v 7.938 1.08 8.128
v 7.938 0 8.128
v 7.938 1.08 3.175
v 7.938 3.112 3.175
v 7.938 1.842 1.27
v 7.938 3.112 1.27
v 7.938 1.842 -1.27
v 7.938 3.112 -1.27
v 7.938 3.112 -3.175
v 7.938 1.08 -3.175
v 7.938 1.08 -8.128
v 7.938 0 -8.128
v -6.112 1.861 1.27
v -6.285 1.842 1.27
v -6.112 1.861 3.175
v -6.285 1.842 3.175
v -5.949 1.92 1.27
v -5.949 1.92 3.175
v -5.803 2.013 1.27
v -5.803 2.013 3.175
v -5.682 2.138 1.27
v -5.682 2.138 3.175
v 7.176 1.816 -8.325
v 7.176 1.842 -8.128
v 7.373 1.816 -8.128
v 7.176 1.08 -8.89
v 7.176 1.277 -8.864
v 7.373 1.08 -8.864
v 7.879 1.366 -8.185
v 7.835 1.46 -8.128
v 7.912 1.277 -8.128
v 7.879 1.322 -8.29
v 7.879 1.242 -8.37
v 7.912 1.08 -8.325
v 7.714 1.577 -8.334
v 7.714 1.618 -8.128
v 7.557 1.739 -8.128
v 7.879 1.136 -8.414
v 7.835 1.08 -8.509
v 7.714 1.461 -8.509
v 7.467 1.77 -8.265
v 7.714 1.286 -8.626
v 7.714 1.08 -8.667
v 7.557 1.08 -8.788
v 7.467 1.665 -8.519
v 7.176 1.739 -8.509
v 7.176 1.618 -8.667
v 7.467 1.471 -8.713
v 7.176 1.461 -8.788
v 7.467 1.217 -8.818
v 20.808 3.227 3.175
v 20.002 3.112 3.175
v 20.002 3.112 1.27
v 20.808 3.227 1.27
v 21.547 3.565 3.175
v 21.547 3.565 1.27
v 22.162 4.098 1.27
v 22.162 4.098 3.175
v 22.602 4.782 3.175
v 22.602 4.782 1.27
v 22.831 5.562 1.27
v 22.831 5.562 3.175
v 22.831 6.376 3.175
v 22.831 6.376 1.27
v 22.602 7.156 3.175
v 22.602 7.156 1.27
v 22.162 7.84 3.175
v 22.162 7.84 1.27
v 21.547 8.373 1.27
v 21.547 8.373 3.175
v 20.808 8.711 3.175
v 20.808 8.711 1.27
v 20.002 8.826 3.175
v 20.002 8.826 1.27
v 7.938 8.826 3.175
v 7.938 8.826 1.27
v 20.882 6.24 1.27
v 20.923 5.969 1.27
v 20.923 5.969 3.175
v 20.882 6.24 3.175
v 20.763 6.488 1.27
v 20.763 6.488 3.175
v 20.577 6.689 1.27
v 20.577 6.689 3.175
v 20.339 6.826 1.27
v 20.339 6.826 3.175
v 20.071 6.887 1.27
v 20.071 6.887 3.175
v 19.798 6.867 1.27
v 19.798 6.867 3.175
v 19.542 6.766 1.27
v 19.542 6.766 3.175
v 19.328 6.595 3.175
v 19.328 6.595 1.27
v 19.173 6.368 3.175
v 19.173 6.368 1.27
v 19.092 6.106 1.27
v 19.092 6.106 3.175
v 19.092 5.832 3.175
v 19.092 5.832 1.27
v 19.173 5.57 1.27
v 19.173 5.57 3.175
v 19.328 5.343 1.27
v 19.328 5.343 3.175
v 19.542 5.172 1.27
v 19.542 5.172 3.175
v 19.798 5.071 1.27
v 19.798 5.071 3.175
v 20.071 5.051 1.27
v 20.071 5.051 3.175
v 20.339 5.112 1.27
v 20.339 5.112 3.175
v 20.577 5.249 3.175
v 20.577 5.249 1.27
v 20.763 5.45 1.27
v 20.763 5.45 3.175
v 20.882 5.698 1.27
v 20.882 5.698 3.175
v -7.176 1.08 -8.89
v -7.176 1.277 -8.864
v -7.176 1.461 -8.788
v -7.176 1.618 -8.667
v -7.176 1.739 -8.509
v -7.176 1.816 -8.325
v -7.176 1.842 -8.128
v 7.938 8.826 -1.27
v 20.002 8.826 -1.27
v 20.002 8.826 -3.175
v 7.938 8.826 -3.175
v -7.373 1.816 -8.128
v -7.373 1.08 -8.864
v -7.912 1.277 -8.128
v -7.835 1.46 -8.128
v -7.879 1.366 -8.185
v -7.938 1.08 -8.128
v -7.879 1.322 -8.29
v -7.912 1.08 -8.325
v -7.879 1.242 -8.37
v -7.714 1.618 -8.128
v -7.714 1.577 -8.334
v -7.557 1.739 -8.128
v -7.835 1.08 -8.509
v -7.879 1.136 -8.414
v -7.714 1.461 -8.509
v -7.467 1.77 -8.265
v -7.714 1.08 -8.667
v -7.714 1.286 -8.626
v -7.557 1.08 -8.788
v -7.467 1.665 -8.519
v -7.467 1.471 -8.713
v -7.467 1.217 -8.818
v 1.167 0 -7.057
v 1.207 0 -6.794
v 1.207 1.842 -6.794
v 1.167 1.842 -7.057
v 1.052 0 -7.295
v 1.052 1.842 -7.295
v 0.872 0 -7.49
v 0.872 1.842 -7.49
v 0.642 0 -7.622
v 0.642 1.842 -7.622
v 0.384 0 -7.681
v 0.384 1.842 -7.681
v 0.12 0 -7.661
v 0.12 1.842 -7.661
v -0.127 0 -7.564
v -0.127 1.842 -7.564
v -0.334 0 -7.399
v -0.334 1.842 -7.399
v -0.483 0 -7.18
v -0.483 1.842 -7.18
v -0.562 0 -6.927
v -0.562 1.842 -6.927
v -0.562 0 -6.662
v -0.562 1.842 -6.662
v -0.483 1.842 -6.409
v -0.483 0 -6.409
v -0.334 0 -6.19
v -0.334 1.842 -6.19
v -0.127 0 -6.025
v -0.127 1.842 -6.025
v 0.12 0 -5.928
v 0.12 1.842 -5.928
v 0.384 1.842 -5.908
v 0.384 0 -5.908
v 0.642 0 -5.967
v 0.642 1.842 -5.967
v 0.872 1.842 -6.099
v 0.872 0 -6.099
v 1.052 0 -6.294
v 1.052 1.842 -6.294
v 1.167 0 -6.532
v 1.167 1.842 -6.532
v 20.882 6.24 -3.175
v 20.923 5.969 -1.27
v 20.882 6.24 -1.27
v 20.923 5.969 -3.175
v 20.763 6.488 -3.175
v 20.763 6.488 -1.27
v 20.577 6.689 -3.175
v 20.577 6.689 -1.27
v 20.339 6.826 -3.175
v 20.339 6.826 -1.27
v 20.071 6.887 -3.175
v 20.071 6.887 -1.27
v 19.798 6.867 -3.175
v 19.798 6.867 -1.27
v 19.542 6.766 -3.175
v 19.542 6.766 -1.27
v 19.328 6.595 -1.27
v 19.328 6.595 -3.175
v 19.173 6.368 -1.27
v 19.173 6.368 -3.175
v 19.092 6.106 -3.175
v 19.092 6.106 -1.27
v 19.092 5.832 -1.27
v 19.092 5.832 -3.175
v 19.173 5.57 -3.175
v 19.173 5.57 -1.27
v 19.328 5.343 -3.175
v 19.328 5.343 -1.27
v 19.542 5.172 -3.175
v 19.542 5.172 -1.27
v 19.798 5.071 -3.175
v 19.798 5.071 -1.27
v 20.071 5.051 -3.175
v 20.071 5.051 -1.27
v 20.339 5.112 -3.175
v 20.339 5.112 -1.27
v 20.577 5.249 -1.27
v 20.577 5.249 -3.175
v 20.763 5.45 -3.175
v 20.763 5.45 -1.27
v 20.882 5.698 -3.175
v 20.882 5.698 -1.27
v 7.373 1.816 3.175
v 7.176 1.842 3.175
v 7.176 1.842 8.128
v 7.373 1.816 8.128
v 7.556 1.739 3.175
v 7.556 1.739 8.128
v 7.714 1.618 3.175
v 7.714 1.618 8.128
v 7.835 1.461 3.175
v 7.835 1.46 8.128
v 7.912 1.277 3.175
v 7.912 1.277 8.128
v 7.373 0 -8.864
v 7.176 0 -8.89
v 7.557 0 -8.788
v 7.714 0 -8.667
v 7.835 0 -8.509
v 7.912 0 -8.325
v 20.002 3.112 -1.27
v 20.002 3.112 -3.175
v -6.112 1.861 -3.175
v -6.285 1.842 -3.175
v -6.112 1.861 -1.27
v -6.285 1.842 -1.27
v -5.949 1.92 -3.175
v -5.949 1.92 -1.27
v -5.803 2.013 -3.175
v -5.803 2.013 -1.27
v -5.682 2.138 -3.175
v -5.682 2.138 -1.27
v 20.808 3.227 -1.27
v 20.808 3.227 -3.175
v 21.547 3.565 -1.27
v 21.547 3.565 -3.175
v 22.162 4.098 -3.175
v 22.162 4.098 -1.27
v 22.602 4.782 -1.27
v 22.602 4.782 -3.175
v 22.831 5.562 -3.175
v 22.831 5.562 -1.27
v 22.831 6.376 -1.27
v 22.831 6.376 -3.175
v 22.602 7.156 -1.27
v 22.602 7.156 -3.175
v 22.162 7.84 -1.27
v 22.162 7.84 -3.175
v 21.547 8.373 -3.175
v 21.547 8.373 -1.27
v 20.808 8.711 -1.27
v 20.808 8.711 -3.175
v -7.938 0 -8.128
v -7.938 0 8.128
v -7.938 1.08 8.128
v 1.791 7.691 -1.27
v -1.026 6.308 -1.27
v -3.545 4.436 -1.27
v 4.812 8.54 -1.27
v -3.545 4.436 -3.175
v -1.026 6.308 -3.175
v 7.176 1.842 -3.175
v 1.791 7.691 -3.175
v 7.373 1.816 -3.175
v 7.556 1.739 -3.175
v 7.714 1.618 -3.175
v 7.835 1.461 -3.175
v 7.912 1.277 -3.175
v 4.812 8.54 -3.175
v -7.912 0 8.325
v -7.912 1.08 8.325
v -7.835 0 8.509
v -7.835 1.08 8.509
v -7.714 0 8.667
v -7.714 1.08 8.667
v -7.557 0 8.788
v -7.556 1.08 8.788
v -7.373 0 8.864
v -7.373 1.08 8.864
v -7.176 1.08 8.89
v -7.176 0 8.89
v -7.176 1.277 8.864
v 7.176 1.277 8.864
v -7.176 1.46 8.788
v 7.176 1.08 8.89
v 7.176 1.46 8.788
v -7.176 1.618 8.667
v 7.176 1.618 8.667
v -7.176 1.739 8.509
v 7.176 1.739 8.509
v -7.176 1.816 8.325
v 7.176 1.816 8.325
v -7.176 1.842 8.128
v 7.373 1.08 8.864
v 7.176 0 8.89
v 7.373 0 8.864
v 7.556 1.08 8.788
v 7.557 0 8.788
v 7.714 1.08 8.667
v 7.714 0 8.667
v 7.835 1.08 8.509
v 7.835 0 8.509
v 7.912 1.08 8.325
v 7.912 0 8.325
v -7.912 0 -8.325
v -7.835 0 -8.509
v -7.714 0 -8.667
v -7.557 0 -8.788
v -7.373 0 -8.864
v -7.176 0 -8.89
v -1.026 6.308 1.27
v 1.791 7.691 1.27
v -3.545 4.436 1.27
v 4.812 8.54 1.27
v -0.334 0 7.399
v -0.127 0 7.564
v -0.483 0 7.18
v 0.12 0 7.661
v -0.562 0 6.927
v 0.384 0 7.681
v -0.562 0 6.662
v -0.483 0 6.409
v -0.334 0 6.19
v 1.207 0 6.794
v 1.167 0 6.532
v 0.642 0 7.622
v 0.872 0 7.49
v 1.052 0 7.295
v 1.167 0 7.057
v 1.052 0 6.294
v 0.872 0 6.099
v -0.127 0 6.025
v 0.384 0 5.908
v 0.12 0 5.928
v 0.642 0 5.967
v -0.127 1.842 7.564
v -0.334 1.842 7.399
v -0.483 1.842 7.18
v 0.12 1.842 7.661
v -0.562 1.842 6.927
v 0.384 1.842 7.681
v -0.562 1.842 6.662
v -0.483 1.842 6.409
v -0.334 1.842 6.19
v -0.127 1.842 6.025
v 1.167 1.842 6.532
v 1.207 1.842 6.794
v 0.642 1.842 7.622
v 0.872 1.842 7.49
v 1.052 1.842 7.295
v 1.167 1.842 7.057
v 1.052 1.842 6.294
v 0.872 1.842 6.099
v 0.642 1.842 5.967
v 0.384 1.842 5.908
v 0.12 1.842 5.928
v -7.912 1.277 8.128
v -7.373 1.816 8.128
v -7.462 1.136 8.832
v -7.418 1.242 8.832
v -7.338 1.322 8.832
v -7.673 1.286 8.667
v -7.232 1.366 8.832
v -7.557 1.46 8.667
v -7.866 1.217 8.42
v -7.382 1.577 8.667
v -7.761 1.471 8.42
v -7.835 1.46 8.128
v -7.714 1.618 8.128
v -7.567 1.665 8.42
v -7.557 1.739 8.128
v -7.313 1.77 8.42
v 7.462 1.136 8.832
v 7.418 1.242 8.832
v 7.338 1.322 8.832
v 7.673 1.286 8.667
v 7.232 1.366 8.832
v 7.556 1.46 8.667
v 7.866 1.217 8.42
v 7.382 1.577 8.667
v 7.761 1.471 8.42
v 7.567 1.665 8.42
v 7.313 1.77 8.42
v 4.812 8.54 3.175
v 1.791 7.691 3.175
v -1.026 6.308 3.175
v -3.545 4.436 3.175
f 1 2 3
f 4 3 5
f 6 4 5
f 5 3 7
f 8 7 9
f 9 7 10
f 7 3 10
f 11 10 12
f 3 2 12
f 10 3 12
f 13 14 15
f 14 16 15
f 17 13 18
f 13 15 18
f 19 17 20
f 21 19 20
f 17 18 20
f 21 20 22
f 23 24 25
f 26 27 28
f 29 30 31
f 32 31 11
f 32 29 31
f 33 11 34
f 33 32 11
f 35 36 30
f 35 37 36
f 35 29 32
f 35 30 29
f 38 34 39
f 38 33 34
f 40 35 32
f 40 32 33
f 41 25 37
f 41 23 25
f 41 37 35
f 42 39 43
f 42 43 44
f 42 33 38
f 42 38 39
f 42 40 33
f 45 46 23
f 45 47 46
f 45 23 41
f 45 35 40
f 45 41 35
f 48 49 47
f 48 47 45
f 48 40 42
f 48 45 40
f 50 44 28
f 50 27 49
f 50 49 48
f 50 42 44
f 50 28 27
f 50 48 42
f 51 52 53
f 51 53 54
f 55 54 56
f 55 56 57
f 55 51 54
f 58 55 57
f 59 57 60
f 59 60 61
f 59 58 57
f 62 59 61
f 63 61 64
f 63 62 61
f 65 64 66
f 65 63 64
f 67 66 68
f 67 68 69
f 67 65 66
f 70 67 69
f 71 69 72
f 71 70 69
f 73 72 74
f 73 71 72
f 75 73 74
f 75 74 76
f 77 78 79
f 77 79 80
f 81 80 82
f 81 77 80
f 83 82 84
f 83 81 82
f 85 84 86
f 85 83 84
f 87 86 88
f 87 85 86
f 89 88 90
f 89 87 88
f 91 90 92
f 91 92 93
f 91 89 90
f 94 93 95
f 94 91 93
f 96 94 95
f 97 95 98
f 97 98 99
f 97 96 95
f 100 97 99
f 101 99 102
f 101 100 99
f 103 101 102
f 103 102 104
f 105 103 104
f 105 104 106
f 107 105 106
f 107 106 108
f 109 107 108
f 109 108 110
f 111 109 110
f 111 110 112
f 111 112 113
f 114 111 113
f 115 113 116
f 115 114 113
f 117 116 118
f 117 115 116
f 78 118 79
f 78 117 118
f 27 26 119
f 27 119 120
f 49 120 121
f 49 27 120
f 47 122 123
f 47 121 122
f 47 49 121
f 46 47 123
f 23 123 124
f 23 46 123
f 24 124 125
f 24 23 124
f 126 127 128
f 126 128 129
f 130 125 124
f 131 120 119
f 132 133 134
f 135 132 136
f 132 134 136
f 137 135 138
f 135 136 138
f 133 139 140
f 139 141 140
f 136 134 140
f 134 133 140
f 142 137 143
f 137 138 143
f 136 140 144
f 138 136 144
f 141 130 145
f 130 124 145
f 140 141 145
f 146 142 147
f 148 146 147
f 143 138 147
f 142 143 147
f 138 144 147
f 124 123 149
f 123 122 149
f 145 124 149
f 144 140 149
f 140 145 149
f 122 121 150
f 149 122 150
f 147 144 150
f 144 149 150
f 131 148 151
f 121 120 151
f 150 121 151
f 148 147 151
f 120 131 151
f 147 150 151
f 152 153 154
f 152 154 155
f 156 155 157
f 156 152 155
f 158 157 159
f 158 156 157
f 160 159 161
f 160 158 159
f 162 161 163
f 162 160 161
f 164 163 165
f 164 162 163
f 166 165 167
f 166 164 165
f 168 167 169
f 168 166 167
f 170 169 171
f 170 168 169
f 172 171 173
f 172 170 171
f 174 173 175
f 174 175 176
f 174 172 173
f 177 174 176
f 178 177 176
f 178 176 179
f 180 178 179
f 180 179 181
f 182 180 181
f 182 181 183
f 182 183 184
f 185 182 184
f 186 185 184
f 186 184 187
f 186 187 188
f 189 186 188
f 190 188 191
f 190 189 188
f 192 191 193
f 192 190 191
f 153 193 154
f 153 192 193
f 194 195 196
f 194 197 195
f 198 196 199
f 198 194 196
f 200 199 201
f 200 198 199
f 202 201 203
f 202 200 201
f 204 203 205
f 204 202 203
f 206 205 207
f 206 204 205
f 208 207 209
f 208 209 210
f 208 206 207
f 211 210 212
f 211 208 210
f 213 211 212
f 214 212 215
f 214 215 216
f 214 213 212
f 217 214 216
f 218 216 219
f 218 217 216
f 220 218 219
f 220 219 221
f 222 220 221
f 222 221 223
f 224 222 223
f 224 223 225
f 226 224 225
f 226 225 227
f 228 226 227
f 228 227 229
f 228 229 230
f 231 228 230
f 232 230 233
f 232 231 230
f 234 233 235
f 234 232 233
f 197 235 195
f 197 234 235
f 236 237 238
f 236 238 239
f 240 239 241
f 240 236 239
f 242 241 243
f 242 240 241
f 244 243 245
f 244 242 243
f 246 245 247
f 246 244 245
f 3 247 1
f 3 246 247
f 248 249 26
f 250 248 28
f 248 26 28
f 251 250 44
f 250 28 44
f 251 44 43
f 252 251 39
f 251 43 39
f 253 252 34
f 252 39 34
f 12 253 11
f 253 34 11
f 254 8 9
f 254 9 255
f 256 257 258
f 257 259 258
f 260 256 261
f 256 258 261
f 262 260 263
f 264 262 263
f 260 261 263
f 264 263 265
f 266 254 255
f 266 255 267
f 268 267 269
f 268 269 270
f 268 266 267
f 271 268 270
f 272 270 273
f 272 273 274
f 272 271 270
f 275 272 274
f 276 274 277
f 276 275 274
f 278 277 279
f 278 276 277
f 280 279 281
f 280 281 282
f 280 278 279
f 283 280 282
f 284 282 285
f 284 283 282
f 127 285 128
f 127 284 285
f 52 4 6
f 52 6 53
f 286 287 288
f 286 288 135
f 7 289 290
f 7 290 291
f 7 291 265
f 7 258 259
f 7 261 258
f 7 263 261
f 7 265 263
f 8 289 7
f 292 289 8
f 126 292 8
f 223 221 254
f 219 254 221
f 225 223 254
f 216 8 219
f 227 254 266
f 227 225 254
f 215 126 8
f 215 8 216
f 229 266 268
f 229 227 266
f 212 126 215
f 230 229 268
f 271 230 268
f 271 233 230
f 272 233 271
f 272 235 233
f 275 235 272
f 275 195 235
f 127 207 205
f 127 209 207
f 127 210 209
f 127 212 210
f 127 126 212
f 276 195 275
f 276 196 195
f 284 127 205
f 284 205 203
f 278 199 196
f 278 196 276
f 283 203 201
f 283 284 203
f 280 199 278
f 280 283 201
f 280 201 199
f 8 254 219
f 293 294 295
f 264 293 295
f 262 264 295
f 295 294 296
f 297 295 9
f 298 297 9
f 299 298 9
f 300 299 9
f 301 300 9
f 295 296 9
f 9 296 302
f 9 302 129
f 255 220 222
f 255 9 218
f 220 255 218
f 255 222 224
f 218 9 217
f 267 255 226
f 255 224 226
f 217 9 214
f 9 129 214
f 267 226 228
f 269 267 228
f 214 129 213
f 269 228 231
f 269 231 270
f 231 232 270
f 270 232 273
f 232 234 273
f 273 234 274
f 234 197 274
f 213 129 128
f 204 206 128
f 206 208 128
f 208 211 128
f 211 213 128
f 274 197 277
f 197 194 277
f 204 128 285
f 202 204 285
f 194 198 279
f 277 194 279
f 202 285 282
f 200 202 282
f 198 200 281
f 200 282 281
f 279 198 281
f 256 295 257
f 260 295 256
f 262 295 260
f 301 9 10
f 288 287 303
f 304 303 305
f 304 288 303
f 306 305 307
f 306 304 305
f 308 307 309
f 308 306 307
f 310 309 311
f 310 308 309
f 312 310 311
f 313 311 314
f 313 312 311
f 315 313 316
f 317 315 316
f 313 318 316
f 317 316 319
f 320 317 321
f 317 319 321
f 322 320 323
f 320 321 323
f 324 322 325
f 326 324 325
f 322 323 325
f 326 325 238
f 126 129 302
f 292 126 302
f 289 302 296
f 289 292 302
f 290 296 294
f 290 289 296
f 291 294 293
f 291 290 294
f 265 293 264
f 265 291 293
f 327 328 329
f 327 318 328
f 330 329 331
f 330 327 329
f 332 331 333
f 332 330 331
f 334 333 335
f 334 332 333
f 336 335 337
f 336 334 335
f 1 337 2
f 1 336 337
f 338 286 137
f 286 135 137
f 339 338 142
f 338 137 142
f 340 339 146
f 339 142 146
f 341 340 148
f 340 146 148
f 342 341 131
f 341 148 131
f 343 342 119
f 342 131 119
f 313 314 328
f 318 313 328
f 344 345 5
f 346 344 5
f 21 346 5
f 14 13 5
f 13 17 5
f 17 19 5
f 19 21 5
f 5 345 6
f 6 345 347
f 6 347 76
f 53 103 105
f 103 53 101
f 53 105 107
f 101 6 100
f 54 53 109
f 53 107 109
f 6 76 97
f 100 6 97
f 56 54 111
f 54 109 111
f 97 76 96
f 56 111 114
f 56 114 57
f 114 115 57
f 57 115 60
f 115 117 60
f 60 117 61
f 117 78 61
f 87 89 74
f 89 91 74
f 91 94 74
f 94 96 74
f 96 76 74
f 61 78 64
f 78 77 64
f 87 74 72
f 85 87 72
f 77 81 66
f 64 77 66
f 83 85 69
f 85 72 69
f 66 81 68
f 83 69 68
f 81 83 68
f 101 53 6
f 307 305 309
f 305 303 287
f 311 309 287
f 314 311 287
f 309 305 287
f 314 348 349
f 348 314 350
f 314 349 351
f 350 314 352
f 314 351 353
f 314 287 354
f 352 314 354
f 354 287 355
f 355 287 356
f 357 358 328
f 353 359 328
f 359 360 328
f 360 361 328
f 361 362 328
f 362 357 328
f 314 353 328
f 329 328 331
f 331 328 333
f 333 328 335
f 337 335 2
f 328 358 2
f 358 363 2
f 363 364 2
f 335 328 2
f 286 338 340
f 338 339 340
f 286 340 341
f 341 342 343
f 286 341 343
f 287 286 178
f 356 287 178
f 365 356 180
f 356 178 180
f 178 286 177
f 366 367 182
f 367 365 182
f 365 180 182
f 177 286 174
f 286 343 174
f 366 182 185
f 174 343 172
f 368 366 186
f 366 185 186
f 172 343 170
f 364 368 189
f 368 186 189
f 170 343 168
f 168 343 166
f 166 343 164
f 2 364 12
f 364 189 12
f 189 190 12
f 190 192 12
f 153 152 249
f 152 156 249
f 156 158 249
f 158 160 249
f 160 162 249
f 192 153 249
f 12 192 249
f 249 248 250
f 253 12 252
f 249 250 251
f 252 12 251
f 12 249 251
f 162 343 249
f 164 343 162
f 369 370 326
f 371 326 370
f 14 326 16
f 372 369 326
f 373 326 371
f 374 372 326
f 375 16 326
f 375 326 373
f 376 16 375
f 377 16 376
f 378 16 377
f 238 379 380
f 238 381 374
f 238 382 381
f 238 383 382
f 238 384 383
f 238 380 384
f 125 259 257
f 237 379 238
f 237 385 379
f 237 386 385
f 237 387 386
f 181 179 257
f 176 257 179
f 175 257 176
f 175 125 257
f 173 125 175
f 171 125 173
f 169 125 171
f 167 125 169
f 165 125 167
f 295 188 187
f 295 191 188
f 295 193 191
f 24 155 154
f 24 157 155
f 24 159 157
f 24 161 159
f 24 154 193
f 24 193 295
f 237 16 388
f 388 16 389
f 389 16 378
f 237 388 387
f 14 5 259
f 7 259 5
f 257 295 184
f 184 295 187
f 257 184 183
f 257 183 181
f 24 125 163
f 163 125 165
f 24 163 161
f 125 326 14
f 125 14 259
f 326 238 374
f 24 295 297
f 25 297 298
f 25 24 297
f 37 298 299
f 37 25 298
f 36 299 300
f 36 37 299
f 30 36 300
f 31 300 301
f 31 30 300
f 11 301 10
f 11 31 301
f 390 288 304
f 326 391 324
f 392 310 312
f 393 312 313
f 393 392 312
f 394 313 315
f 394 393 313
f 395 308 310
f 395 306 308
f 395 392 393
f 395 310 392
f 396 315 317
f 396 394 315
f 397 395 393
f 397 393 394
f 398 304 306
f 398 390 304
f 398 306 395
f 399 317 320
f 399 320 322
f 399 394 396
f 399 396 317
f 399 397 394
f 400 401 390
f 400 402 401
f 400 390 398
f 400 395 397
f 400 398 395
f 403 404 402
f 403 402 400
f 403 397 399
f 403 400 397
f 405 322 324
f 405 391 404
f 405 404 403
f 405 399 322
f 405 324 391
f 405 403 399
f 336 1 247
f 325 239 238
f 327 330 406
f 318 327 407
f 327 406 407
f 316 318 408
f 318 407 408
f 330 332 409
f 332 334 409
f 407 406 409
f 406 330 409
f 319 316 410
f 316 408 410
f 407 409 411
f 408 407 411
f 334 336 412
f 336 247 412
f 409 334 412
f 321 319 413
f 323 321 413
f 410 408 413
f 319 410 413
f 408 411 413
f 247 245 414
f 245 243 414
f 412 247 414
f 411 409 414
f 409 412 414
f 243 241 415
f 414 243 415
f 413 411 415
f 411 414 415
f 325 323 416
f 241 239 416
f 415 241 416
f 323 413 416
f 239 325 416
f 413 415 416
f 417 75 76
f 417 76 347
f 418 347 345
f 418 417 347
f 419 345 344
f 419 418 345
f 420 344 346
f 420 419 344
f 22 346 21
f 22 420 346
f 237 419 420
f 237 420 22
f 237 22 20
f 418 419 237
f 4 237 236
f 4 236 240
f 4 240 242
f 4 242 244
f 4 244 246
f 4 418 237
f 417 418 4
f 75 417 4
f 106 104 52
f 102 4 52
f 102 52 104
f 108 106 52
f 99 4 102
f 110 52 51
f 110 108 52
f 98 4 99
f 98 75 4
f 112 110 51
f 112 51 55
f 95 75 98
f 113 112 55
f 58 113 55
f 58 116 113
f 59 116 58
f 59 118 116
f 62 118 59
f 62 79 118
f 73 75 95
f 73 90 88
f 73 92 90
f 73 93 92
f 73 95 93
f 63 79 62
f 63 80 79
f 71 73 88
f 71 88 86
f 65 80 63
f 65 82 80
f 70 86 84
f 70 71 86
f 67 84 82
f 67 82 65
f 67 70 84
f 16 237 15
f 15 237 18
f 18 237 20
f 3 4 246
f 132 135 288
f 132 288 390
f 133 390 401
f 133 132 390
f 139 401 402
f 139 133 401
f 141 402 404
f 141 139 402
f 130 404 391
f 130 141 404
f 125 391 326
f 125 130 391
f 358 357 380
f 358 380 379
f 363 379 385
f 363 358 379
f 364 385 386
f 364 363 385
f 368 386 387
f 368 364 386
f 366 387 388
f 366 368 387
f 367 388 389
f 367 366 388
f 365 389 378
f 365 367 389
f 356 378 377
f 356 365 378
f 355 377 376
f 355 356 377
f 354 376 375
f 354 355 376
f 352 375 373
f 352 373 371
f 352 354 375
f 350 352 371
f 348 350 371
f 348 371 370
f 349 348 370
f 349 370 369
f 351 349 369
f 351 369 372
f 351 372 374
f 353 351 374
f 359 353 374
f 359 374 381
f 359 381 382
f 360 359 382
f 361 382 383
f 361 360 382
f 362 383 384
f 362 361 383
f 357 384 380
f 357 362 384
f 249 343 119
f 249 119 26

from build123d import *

# Parameters (mm, degrees)
SKETCH1_W           = 15.875
SKETCH1_H           = 17.78
SKETCH1_R           = 0.889
BOSS_EXTRUDE1_DEPTH = 1.8415
SKETCH2_R           = 0.92075
BOSS_EXTRUDE2_DEPTH = 3.175
SKETCH2_2_R         = 0.92075
CUT_EXTRUDE1_DEPTH  = 1.27
FILLET1_R           = 0.762


with BuildPart() as part:
    # Sketch1 → Boss-Extrude1 (new body)
    with BuildSketch(Plane(origin=(0, 0, 0), x_dir=(1, 0, 0), z_dir=(0, 1, 0))):
        Rectangle(SKETCH1_W, SKETCH1_H)
        with Locations((0.3175, 6.7945)):
            Circle(SKETCH1_R, mode=Mode.SUBTRACT)
        with Locations((0.3175, -6.7945)):
            Circle(SKETCH1_R, mode=Mode.SUBTRACT)
    extrude(amount=BOSS_EXTRUDE1_DEPTH)

    # Sketch2 → Boss-Extrude2 (add, symmetric)
    with BuildSketch(Plane.XY):
        with BuildLine():
            ThreePointArc((7.9375, 8.8265), (0.184776704, 6.981333441), (-5.9055, 1.8415))
            Line((-5.9055, 1.8415), (7.9375, 1.8415))
            Line((7.9375, 1.8415), (7.9375, 3.1115))
            Line((7.9375, 3.1115), (20.0025, 3.1115))
            ThreePointArc((20.0025, 3.1115), (22.86, 5.969), (20.0025, 8.8265))
            Line((20.0025, 8.8265), (7.9375, 8.8265))
        make_face()
        with Locations((20.0025, 5.969)):
            Circle(SKETCH2_R, mode=Mode.SUBTRACT)
    extrude(amount=BOSS_EXTRUDE2_DEPTH, both=True)

    # Sketch2<2> → Cut-Extrude1 (cut, symmetric)
    with BuildSketch(Plane.XY):
        with BuildLine():
            ThreePointArc((7.9375, 8.8265), (0.184776704, 6.981333441), (-5.9055, 1.8415))
            Line((-5.9055, 1.8415), (7.9375, 1.8415))
            Line((7.9375, 1.8415), (7.9375, 3.1115))
            Line((7.9375, 3.1115), (20.0025, 3.1115))
            ThreePointArc((20.0025, 3.1115), (22.86, 5.969), (20.0025, 8.8265))
            Line((20.0025, 8.8265), (7.9375, 8.8265))
        make_face()
        with Locations((20.0025, 5.969)):
            Circle(SKETCH2_2_R, mode=Mode.SUBTRACT)
    extrude(amount=CUT_EXTRUDE1_DEPTH, both=True, mode=Mode.SUBTRACT)

    # Fillet1
    fillet1_edges = [part.edges().sort_by_distance(p)[0] for p in [
        (7.9375, 1.8415, 6.0325),
        (0, 1.8415, -8.89),
        (7.9375, 1.8415, -6.0325),
        (-5.9055, 1.8415, 2.2225),
        (-5.9055, 1.8415, -2.2225),
        (-7.9375, 1.8415, 0),
        (-7.9375, 0.92075, -8.89),
        (7.9375, 0.92075, -8.89),
        (7.9375, 0.92075, 8.89),
        (-7.9375, 0.92075, 8.89),
        (0, 1.8415, 8.89),
    ]]
    fillet(fillet1_edges, radius=FILLET1_R)


solid = part.part
